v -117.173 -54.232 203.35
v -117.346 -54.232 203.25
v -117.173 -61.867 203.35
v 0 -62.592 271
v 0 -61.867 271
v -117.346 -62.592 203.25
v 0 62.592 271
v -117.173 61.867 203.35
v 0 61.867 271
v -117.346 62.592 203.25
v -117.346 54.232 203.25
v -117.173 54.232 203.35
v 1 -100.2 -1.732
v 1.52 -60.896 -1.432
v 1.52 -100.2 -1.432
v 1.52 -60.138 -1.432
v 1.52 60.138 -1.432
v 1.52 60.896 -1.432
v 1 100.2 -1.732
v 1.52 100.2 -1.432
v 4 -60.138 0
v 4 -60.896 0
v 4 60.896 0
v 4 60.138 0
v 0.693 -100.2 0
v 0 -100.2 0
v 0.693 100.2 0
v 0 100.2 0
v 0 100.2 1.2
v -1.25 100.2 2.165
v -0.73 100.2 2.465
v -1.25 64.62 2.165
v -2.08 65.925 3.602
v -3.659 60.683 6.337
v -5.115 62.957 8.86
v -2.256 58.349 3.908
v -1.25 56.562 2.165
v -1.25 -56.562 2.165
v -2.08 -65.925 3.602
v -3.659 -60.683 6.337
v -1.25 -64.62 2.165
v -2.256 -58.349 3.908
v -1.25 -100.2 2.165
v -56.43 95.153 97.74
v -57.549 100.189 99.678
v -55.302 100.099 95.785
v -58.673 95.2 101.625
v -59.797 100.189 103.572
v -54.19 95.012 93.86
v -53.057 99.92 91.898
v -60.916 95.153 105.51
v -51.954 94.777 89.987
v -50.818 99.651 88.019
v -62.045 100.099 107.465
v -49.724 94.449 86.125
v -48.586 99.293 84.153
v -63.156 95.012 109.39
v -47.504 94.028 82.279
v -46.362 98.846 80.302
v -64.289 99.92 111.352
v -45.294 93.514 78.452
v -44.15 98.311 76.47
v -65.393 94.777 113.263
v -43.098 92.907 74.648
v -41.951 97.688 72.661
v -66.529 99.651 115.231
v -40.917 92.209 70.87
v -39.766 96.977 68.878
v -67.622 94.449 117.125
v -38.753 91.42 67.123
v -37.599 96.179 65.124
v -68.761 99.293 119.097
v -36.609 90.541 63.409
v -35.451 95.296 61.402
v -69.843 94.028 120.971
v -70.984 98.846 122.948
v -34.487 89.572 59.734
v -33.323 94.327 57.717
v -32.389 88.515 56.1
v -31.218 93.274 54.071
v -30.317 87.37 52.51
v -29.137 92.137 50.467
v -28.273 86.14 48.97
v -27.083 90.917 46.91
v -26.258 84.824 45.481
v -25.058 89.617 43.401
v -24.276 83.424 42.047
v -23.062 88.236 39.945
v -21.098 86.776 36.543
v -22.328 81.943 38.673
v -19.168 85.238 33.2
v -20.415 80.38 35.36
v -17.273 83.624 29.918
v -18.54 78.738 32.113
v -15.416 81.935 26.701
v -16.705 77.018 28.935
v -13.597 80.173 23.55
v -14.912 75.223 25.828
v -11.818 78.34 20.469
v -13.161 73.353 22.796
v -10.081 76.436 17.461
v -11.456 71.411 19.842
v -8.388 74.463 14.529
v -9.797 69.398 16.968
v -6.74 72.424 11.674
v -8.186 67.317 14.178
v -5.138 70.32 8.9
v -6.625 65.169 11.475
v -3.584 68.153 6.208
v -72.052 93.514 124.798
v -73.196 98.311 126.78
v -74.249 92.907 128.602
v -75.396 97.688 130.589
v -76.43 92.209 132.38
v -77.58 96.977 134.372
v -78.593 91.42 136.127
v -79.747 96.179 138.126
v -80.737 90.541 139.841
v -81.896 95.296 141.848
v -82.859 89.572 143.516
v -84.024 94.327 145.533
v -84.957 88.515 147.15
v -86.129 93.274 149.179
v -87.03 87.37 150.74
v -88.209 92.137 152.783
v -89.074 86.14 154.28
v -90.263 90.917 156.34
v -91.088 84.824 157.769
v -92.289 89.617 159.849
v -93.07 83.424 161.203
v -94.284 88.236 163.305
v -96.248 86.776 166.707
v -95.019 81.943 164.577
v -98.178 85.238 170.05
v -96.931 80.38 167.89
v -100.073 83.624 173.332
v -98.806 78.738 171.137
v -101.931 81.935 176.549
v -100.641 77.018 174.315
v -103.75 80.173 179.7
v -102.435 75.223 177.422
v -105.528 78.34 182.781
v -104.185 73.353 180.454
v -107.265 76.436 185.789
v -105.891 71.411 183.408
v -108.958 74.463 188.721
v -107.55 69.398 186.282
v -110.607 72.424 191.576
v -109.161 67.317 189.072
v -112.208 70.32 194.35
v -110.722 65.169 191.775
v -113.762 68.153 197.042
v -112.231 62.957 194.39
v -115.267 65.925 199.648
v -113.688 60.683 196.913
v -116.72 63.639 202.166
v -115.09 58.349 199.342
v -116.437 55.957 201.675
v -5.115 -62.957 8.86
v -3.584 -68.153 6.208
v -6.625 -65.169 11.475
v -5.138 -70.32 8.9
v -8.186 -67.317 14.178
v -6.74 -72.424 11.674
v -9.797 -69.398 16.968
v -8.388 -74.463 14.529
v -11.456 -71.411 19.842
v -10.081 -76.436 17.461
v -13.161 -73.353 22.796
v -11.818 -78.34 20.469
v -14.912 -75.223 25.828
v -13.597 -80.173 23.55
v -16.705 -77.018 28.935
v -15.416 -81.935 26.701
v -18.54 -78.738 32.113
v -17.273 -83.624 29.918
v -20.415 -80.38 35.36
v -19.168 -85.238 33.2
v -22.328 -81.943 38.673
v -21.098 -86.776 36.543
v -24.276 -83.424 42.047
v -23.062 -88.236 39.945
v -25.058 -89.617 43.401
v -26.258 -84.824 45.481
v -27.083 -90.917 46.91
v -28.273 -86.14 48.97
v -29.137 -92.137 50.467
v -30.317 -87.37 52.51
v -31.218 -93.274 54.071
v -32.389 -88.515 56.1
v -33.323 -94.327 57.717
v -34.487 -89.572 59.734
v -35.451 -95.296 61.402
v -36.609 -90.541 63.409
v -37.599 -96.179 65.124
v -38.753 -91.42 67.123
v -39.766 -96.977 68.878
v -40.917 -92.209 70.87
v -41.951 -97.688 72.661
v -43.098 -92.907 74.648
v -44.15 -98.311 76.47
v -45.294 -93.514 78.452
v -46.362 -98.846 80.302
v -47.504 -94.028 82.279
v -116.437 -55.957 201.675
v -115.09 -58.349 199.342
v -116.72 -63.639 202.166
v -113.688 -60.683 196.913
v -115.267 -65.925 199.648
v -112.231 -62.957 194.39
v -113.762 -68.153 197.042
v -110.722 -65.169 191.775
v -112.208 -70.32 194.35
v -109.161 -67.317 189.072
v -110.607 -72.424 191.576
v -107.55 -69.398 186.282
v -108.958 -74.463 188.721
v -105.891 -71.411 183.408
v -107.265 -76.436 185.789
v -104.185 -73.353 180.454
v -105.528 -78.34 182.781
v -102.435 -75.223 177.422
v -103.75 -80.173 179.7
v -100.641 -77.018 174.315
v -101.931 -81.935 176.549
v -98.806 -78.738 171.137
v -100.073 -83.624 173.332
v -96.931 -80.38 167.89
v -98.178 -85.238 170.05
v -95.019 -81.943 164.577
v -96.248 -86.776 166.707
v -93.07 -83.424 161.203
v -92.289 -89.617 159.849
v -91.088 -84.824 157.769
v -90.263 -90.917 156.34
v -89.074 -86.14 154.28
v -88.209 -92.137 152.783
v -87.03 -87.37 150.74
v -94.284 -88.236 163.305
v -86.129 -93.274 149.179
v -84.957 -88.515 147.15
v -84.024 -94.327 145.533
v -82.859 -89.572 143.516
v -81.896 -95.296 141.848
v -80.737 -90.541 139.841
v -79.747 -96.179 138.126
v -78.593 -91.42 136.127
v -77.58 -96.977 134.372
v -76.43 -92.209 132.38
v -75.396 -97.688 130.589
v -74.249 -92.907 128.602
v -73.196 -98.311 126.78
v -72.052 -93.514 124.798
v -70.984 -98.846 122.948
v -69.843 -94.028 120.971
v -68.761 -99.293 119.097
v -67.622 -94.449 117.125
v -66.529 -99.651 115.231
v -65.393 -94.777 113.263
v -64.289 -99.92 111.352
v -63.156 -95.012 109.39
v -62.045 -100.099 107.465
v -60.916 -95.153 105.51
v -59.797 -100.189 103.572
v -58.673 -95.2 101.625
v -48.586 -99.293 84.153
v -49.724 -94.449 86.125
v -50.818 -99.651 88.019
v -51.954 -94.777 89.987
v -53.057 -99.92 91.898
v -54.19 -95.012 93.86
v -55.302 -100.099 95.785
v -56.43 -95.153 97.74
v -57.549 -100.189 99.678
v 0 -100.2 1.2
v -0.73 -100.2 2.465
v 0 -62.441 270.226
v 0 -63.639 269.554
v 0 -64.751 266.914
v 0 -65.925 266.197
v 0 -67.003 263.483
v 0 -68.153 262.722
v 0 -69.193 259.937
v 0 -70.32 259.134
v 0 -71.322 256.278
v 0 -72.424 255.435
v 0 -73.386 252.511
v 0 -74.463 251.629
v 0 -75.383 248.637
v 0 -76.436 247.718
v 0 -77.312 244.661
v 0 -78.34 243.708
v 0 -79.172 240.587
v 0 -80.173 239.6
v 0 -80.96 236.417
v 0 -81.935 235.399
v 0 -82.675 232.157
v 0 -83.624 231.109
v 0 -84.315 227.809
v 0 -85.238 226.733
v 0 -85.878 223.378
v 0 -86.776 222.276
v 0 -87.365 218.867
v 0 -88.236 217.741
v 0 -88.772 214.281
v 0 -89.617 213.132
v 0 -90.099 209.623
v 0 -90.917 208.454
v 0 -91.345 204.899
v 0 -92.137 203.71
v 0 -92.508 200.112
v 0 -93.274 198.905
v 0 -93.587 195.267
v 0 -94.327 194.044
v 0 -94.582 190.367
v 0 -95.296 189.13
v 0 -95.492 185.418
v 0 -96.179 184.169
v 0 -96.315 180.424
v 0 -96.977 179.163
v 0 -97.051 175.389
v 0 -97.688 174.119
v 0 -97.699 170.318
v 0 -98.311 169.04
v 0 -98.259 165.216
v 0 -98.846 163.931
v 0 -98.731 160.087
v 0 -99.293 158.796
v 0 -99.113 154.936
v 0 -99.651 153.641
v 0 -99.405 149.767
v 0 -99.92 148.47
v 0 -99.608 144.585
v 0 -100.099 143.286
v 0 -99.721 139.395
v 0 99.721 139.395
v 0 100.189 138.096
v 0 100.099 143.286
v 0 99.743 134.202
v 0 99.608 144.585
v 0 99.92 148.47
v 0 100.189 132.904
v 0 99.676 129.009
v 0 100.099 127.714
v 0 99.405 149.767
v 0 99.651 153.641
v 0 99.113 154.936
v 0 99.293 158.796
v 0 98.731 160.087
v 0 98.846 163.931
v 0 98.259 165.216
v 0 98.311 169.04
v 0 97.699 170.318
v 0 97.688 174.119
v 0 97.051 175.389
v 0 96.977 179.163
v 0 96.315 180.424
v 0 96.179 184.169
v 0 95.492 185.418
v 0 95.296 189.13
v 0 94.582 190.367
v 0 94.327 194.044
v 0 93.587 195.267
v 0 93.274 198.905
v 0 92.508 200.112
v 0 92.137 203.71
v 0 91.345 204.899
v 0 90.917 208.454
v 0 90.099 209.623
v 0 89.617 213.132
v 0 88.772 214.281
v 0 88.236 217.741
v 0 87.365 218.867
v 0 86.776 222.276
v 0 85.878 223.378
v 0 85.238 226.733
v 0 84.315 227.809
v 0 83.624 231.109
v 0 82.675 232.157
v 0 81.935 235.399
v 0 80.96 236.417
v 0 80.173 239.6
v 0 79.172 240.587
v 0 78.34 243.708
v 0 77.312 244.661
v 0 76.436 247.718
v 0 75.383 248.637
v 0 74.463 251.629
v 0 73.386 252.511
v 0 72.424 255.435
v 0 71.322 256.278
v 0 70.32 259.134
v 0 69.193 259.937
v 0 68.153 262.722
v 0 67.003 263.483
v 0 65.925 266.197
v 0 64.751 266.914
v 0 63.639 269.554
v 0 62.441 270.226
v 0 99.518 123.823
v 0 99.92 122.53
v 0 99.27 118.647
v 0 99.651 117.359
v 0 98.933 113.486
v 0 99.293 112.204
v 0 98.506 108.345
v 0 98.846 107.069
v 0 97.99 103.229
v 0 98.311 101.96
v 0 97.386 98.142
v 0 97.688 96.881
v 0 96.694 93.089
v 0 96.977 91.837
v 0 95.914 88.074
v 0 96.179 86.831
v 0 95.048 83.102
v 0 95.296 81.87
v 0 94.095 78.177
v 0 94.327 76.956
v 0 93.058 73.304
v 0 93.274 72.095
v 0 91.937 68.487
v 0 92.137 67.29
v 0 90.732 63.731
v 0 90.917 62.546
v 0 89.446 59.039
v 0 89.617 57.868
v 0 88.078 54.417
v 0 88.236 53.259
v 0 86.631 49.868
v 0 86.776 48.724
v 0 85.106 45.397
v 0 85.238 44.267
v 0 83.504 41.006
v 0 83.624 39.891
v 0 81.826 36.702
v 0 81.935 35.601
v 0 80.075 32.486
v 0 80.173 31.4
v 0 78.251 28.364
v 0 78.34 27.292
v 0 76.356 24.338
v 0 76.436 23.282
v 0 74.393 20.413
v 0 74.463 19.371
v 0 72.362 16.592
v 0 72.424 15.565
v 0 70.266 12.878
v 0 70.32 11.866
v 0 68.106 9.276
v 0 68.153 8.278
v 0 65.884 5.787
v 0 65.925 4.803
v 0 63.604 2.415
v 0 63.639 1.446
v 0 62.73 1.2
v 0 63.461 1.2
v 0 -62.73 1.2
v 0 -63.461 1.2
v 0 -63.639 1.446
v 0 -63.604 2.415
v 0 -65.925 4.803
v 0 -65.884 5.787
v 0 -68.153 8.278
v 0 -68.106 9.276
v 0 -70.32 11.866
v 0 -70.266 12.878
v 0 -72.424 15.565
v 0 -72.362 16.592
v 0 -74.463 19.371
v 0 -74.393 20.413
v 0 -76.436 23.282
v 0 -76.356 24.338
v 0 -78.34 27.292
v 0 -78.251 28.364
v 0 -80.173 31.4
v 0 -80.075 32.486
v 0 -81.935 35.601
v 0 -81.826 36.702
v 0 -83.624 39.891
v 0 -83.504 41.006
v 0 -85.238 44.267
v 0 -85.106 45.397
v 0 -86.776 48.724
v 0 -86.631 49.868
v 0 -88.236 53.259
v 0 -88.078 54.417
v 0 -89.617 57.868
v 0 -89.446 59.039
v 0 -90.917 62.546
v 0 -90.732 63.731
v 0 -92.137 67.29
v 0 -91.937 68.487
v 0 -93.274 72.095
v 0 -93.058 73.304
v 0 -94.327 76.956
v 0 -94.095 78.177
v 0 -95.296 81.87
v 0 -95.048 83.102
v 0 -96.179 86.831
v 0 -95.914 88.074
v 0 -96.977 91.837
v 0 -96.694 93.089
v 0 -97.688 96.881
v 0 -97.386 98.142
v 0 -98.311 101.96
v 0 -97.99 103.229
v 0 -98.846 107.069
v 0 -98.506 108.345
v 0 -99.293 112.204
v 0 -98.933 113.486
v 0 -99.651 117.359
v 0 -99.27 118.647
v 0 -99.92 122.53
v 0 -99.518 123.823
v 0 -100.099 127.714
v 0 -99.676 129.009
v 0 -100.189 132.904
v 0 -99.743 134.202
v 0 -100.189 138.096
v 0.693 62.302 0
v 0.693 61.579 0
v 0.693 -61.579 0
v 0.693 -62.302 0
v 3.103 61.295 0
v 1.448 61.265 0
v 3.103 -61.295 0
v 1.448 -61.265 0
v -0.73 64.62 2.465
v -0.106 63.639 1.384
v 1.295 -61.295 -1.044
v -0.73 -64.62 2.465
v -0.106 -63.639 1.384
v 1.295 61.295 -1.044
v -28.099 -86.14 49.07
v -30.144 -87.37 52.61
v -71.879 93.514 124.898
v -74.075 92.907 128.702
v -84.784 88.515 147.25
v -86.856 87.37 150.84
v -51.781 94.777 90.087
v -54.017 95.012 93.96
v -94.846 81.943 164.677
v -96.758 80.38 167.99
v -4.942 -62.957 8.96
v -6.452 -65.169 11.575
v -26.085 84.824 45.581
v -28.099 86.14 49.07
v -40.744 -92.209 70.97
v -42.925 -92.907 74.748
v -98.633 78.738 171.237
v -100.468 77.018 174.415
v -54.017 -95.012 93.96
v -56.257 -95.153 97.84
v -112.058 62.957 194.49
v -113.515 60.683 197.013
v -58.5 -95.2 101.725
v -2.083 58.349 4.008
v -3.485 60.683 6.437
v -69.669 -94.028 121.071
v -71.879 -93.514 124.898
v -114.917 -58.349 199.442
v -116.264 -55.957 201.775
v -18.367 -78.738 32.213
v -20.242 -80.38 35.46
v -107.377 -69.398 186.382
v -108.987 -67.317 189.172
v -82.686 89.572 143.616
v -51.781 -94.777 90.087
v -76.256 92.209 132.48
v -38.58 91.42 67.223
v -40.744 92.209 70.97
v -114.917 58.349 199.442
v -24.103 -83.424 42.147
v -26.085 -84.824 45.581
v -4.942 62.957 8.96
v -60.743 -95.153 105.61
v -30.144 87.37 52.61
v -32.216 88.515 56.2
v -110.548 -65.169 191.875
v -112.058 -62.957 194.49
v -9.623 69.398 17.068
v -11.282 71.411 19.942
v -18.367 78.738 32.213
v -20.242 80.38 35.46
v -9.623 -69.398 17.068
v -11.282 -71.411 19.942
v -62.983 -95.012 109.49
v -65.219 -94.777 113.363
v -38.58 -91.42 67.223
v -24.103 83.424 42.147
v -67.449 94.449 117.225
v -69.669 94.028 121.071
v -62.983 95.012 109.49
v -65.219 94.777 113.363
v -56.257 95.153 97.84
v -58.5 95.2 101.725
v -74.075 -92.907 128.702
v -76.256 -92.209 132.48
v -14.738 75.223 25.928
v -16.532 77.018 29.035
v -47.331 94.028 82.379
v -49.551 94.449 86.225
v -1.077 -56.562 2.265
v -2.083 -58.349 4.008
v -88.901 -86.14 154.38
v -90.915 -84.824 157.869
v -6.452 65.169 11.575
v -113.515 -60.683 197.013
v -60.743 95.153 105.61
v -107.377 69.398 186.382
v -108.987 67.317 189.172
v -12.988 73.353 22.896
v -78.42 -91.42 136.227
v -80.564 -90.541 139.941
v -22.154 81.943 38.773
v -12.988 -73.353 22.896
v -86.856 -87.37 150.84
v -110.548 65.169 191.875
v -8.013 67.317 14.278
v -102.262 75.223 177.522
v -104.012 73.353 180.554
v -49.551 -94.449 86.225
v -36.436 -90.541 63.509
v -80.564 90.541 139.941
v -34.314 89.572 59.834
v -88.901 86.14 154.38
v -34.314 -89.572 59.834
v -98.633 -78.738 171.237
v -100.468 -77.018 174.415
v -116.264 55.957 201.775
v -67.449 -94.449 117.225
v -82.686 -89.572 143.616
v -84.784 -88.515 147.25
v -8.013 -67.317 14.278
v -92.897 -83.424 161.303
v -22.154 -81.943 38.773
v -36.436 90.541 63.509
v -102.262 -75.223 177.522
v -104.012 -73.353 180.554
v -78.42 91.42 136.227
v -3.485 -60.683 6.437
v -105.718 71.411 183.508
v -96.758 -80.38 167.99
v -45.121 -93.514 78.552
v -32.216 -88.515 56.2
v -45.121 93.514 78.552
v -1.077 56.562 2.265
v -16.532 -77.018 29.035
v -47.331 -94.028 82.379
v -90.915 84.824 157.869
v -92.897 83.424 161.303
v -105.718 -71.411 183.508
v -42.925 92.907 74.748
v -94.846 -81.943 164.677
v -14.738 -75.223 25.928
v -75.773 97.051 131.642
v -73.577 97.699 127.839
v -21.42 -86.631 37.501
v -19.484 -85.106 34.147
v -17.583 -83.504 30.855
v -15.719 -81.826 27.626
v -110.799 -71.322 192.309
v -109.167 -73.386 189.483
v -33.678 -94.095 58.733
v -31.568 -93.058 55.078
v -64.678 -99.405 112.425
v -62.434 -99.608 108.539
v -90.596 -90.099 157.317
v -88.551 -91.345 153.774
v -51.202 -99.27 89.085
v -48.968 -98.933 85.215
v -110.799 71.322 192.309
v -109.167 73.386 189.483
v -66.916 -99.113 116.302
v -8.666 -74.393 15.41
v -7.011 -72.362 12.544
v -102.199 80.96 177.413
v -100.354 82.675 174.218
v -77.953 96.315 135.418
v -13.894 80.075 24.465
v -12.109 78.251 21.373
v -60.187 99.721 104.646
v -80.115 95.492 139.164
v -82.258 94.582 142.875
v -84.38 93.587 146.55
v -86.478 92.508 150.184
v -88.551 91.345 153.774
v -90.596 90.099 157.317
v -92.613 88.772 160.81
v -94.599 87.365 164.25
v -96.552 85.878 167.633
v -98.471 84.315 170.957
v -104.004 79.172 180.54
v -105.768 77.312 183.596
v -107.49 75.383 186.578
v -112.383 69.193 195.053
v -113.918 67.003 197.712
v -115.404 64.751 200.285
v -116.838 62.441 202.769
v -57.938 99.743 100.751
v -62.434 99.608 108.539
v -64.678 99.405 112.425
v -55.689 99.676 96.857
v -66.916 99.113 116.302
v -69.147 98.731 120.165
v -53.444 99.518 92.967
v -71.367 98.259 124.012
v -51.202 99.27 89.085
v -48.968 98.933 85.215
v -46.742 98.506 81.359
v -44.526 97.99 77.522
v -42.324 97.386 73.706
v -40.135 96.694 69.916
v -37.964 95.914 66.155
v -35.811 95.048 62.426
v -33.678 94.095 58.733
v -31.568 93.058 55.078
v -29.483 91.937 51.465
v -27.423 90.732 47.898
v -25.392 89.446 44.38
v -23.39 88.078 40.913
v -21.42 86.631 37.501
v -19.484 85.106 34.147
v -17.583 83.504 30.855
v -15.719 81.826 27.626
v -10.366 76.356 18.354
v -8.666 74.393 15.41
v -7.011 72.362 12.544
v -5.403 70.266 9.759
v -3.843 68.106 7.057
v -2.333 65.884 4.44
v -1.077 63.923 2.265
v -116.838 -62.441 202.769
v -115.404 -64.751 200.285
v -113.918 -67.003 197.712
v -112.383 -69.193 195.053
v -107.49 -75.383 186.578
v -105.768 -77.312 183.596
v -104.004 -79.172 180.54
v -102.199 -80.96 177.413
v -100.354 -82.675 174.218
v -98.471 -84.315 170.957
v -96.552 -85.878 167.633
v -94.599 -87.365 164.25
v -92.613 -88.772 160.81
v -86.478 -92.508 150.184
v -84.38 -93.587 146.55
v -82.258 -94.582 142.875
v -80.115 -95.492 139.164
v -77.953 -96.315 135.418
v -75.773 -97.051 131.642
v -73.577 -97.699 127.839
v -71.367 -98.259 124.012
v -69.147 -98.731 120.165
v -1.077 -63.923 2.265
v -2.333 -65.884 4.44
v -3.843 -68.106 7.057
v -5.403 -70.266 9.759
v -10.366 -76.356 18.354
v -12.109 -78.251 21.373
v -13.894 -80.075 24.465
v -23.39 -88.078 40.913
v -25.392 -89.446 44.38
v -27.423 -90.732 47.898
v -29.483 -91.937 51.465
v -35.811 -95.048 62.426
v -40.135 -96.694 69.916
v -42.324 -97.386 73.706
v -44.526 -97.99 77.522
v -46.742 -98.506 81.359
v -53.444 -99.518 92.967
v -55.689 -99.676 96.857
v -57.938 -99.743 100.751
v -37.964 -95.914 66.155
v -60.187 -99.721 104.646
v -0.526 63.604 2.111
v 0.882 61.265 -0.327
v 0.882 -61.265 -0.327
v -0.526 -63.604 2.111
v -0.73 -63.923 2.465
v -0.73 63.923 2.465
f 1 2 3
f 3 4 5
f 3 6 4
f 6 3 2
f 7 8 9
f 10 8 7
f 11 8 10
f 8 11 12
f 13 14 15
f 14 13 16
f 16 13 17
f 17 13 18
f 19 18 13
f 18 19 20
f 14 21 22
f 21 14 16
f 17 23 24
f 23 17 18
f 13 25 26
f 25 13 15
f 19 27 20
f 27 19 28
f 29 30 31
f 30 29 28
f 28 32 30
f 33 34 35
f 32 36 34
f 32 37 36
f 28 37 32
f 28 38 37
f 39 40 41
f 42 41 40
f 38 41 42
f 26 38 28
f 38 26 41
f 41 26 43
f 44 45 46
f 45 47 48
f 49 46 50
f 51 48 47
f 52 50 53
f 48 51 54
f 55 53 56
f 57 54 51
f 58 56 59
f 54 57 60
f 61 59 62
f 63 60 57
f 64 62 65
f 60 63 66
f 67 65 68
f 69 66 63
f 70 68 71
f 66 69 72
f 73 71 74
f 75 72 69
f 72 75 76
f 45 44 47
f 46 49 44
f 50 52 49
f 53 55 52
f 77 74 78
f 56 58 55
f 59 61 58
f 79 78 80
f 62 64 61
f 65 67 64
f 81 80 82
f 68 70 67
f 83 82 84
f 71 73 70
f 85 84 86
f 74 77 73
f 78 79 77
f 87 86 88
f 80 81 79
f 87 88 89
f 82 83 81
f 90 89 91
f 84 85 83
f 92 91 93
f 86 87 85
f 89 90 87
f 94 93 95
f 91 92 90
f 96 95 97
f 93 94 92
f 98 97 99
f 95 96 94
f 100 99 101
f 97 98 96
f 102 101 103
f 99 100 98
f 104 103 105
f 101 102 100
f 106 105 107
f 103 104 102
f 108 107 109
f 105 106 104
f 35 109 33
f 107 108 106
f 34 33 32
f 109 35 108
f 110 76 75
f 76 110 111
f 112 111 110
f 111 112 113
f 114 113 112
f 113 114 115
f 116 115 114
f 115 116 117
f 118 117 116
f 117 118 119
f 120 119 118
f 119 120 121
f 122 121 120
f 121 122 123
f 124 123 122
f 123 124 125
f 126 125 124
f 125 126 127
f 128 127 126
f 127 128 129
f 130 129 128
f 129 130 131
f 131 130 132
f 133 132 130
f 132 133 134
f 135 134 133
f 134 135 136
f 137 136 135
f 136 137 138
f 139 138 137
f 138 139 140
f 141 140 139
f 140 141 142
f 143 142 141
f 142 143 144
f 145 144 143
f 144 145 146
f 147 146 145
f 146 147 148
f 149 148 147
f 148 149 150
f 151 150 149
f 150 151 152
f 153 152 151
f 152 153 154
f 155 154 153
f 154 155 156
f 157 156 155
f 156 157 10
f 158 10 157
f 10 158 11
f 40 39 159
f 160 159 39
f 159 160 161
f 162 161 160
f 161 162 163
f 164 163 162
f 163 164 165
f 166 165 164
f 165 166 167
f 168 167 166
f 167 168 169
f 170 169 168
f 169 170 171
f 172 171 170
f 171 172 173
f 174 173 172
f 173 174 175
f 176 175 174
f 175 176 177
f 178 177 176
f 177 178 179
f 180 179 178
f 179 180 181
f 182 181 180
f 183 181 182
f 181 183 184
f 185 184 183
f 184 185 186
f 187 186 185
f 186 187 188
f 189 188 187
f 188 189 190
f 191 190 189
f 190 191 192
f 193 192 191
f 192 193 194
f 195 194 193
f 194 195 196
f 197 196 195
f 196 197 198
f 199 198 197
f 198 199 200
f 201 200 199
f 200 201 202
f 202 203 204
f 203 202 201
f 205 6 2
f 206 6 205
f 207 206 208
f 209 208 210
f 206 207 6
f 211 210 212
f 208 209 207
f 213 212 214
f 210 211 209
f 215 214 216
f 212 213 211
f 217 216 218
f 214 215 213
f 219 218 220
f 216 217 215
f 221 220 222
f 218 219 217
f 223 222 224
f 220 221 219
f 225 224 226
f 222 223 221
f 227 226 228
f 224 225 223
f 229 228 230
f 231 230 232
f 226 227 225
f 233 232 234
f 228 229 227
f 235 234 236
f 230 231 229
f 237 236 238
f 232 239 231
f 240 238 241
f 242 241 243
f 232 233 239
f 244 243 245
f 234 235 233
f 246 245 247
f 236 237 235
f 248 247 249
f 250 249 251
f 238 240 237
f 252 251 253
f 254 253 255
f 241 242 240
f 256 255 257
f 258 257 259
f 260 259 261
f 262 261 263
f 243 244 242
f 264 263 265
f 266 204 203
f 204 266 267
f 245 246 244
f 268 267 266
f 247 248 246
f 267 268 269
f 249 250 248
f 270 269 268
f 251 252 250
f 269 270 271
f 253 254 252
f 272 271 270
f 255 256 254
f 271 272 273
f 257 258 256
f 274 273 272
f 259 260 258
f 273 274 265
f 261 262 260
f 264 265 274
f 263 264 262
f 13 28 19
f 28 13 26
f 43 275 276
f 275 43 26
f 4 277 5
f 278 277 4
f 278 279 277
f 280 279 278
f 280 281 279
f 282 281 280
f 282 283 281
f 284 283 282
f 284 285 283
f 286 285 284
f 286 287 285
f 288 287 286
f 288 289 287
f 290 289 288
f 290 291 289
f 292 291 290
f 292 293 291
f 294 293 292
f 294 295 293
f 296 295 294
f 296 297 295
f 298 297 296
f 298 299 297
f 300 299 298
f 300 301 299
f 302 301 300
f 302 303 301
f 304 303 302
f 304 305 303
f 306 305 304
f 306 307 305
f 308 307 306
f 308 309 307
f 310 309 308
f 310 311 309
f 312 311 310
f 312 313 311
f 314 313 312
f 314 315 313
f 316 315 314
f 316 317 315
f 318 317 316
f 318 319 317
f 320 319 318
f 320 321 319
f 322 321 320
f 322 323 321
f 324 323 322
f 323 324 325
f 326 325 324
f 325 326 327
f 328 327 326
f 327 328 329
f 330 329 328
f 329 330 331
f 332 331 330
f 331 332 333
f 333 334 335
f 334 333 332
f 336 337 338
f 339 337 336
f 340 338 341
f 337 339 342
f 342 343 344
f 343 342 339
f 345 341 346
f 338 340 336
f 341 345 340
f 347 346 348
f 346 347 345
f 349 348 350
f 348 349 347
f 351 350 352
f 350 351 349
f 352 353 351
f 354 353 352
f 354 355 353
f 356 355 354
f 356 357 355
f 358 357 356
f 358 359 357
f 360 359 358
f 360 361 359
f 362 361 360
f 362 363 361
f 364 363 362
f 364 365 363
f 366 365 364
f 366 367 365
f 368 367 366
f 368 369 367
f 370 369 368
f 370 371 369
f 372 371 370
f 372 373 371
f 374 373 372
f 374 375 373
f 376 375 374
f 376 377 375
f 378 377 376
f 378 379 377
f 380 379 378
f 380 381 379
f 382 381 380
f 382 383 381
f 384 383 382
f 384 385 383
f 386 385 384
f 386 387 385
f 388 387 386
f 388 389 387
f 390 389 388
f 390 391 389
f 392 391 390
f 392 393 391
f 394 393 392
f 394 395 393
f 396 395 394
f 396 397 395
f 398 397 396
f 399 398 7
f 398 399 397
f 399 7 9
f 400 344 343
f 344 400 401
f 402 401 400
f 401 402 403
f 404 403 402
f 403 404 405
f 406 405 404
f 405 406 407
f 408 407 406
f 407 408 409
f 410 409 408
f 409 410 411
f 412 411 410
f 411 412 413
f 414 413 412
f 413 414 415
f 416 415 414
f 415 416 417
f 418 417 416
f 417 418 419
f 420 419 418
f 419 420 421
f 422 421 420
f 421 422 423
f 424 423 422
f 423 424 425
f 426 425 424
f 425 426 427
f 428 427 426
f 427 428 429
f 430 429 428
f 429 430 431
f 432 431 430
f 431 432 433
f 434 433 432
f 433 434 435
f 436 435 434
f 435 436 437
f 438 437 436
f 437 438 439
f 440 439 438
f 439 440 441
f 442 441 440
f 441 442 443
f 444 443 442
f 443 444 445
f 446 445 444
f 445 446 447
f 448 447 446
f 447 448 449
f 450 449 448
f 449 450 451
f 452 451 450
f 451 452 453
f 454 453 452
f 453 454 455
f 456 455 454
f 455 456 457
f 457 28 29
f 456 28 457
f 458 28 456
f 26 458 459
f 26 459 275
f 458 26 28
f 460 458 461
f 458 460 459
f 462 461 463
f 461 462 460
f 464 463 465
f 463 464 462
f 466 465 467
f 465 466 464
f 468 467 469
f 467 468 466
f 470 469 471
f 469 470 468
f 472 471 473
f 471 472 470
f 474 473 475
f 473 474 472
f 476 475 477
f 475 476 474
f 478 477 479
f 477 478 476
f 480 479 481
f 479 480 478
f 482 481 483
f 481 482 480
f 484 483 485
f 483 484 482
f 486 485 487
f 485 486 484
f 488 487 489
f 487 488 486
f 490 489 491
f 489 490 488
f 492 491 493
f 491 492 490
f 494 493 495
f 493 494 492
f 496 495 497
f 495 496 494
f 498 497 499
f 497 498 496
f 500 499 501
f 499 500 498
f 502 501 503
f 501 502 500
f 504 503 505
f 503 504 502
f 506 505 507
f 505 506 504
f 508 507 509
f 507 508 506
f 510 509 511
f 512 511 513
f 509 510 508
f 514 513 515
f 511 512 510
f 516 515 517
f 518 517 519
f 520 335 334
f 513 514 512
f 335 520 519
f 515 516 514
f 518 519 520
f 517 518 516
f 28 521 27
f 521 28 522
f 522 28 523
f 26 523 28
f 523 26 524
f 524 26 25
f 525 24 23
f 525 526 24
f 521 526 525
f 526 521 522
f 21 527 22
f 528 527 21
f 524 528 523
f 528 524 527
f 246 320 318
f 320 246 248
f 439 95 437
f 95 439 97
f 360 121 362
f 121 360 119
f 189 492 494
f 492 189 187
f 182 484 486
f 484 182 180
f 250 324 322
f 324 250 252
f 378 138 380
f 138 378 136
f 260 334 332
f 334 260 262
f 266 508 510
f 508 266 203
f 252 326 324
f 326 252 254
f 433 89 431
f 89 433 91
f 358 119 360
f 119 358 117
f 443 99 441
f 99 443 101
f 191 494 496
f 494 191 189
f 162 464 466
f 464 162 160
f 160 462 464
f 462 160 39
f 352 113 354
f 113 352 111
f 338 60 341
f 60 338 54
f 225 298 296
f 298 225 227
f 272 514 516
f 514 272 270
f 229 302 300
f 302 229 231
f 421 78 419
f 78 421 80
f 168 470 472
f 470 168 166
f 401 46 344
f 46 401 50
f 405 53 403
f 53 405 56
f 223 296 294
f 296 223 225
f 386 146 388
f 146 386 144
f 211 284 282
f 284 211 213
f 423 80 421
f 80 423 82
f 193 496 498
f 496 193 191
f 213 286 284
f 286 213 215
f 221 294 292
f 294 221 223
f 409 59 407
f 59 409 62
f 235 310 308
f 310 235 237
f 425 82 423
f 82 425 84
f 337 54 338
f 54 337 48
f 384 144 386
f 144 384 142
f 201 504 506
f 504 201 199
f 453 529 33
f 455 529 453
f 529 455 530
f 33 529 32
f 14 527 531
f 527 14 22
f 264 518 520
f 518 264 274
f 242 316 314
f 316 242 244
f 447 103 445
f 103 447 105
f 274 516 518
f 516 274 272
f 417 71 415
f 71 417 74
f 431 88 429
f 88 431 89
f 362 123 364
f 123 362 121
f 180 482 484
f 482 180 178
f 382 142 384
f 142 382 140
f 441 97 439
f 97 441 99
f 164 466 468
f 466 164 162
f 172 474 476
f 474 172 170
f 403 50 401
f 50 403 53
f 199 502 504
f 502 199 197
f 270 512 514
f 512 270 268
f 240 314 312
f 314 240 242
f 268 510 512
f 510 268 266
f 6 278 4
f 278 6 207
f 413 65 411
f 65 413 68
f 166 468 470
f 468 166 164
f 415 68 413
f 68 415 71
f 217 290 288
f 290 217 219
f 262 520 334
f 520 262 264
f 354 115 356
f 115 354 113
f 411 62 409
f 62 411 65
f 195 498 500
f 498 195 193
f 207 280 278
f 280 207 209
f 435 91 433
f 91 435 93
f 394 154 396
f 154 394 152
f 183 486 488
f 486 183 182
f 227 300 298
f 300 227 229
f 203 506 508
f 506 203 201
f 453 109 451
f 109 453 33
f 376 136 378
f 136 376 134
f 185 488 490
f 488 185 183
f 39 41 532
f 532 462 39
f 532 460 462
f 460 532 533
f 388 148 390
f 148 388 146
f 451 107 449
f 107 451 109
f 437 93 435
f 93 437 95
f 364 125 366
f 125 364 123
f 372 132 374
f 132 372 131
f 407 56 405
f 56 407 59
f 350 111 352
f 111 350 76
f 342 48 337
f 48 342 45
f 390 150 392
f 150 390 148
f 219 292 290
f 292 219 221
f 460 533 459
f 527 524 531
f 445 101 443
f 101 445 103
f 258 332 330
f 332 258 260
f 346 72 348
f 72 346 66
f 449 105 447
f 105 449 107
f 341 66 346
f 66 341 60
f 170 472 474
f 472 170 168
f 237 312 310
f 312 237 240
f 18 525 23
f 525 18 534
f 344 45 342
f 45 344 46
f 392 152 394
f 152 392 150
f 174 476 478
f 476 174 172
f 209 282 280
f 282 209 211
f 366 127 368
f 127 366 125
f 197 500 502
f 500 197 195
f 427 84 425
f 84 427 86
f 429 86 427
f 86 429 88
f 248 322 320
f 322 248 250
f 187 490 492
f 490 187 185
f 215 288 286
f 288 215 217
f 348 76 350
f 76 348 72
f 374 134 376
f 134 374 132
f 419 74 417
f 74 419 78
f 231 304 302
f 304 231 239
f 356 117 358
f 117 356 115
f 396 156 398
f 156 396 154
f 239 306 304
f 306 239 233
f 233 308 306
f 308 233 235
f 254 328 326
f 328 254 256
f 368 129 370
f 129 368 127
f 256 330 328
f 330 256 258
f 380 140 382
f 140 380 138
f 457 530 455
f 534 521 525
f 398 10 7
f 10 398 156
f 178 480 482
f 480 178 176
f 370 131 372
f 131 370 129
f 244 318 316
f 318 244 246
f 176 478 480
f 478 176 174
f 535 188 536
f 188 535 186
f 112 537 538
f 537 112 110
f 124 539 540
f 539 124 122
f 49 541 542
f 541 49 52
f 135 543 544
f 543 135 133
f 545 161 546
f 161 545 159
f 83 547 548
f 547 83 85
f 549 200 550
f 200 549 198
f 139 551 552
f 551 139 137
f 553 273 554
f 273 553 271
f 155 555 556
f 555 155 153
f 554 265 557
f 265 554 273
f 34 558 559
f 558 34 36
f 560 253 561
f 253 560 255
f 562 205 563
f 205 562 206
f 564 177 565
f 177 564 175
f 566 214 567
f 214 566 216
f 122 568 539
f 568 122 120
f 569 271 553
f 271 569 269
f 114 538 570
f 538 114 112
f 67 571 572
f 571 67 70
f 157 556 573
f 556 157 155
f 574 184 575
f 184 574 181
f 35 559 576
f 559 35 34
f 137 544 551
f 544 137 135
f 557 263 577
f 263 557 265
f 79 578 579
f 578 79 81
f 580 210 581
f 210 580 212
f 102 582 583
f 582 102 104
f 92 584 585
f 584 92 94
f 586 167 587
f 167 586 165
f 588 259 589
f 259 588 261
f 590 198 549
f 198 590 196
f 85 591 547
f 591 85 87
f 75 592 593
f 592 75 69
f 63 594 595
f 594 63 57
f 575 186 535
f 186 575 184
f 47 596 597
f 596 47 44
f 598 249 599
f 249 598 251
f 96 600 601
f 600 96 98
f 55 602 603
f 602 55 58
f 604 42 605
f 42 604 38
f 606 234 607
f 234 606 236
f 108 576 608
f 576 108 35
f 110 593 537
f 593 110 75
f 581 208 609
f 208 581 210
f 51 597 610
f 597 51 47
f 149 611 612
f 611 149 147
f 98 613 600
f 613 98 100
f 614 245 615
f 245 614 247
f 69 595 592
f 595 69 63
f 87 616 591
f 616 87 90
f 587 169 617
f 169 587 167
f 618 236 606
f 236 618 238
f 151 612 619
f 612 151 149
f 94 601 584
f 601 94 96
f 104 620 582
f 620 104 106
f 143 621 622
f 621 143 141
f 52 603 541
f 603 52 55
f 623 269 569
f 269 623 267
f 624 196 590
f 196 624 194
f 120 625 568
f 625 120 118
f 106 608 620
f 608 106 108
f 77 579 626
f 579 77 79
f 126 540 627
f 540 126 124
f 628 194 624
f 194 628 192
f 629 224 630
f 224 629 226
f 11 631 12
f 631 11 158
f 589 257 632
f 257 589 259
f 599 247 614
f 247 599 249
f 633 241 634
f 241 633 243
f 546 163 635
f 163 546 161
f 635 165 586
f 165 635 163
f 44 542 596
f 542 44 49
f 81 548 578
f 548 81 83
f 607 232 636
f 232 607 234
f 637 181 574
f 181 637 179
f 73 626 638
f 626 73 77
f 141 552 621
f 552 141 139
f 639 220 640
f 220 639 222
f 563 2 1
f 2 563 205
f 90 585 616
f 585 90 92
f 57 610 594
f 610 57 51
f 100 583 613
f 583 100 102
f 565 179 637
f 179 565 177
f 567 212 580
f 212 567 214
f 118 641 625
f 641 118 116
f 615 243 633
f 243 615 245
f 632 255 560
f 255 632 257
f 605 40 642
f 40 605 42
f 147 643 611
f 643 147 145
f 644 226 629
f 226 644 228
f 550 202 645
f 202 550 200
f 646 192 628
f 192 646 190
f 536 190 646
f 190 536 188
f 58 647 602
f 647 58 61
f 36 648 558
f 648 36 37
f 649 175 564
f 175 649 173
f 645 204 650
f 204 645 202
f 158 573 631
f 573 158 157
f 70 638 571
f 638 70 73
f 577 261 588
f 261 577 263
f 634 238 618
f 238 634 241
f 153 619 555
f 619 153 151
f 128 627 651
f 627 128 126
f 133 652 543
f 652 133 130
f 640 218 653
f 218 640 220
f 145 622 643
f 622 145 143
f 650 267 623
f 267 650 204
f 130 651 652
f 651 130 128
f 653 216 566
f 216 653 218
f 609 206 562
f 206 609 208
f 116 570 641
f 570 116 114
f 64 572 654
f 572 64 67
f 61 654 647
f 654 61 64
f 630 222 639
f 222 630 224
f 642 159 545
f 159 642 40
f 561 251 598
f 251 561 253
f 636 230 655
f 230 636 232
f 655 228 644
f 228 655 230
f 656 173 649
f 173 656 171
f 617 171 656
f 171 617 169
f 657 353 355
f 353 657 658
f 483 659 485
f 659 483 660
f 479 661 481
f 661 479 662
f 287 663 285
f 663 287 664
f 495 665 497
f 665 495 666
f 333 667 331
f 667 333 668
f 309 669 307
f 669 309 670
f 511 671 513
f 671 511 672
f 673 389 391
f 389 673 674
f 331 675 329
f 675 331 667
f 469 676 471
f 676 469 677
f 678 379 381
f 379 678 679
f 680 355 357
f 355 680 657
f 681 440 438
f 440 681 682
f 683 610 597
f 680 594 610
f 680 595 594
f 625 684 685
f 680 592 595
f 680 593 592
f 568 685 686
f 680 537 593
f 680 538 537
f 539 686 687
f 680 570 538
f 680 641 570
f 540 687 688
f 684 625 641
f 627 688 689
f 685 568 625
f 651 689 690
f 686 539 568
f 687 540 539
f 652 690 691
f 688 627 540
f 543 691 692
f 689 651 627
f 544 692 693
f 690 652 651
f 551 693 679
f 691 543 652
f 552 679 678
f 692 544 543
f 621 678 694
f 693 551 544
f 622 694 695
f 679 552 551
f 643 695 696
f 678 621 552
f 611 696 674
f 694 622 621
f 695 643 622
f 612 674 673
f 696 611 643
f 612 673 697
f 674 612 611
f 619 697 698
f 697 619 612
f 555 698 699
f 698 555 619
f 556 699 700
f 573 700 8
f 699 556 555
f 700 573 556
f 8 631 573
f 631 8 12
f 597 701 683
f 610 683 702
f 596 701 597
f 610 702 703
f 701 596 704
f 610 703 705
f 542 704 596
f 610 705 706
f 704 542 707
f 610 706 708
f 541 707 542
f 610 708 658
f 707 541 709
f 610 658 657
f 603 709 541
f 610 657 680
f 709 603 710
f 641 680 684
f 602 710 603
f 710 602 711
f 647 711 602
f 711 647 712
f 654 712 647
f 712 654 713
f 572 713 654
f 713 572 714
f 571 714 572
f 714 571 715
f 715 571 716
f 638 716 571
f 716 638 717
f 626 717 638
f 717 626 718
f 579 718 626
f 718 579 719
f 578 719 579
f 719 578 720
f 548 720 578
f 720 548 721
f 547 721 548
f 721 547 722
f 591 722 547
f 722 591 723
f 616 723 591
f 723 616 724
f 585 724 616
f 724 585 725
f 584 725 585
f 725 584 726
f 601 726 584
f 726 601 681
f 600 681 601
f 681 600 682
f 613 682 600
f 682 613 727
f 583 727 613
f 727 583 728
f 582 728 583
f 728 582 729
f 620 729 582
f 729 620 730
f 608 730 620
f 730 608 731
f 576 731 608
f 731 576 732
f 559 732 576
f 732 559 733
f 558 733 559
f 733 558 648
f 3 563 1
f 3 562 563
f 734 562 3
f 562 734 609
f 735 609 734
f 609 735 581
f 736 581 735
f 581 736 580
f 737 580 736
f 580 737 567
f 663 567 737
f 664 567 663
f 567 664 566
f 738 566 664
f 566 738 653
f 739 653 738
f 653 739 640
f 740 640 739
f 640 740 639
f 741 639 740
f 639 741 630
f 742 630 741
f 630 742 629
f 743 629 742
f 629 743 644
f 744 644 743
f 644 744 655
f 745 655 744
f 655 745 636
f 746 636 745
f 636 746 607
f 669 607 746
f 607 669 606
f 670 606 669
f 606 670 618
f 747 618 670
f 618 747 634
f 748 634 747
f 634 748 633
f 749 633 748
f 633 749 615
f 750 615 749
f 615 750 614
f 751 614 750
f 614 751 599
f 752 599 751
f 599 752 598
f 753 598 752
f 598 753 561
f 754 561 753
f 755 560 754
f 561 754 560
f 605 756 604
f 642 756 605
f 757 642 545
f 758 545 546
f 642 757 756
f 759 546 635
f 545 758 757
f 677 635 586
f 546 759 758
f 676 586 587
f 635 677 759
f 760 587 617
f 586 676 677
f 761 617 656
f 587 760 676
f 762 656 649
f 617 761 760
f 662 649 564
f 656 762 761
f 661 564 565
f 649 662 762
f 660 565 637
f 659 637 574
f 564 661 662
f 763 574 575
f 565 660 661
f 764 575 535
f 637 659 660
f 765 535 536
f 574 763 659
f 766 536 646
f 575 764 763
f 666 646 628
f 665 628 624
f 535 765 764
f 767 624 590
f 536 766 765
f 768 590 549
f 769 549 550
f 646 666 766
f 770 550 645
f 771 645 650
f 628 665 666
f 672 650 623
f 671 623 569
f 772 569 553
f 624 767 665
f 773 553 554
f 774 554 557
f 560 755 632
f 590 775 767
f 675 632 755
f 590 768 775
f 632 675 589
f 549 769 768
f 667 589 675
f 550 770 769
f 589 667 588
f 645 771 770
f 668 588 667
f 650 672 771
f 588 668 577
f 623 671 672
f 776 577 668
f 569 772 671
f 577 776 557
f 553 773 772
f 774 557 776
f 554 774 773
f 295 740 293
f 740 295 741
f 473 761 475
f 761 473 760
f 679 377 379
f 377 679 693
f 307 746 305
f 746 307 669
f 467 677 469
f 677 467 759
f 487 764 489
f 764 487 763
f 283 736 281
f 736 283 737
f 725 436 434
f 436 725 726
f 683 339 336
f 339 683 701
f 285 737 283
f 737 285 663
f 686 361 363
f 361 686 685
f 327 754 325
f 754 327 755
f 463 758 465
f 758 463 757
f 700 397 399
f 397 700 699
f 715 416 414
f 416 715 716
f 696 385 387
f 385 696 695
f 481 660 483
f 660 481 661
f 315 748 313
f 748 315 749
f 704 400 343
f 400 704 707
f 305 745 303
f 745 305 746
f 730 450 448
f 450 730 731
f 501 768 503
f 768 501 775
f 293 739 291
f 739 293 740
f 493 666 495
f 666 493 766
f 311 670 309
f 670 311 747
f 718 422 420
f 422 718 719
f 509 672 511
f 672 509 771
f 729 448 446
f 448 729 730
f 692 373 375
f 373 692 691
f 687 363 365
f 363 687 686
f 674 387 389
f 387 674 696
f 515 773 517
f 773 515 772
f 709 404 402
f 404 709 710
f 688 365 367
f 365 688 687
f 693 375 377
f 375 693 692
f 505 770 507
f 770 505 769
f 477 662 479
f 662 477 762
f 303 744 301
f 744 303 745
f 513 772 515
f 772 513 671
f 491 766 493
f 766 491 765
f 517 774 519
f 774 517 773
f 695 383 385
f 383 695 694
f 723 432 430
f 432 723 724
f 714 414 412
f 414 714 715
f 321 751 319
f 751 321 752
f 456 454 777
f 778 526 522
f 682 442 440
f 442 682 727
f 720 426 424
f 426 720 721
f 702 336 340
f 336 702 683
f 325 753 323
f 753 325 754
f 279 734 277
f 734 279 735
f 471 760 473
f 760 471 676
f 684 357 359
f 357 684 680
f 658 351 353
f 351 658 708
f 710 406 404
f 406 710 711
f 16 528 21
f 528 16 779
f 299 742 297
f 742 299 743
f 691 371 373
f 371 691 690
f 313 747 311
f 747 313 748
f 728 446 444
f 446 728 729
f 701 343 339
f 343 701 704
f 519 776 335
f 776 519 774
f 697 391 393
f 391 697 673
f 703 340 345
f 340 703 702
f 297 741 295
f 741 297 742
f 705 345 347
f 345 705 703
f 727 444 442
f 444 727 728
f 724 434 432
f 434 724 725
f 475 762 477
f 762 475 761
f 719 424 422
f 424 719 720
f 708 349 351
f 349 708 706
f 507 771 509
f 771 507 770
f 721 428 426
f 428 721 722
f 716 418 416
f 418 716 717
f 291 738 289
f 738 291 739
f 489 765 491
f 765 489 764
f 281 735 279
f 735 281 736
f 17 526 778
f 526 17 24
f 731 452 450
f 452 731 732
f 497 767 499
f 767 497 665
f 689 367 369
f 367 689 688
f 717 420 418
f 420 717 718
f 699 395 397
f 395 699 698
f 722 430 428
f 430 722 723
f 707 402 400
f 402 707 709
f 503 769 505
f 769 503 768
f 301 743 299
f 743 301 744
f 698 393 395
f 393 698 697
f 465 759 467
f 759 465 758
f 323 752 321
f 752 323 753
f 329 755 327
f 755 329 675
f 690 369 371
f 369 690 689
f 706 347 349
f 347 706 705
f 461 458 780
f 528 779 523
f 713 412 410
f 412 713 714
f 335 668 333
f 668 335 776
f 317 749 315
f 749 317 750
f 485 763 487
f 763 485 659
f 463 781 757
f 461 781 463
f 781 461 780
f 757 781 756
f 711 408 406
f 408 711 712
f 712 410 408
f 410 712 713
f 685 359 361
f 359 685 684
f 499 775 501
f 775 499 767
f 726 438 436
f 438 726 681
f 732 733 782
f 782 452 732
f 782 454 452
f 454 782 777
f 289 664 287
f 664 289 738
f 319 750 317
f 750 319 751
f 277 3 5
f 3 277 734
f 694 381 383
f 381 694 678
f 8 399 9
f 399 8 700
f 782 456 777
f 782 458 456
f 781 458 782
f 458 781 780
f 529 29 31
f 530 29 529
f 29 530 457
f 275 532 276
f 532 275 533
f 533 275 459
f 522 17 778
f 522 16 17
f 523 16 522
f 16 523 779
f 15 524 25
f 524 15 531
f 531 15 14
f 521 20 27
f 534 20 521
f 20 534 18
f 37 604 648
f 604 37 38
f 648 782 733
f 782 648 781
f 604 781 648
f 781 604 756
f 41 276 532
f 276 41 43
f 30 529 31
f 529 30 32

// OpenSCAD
//import("turing1.stl");

$fa=.01;
$fs=$preview ? 30 : 3;
x=4;
y=200.4;
z=271;
twt=.454;
module turing(){
    translate([0,-y/2,0])
        cube([x,y,z]);
}

module turning() rotate([0,-60,0])turing();
rotate([0,60,0]) intersection(){
    difference(){
        hull(){
            turning();
            linear_extrude(.1) projection() turning();
        }
        turning();
    }
    union(){
        translate([-z*cos(30)/2,0,0]) difference() {
                scale([1.5,1,1]) cylinder(d=y,h=z);
                translate([0,0,-.2]) scale([1.5,1,1]) cylinder(d=y-10,h=z);
                translate([0,0,.2]) scale([1.5,1,1]) cylinder(d=y-2*twt,h=z);
        }
    translate([-2.5,-y/2,0])
        cube([5,y,.6]);
        
    }
}
